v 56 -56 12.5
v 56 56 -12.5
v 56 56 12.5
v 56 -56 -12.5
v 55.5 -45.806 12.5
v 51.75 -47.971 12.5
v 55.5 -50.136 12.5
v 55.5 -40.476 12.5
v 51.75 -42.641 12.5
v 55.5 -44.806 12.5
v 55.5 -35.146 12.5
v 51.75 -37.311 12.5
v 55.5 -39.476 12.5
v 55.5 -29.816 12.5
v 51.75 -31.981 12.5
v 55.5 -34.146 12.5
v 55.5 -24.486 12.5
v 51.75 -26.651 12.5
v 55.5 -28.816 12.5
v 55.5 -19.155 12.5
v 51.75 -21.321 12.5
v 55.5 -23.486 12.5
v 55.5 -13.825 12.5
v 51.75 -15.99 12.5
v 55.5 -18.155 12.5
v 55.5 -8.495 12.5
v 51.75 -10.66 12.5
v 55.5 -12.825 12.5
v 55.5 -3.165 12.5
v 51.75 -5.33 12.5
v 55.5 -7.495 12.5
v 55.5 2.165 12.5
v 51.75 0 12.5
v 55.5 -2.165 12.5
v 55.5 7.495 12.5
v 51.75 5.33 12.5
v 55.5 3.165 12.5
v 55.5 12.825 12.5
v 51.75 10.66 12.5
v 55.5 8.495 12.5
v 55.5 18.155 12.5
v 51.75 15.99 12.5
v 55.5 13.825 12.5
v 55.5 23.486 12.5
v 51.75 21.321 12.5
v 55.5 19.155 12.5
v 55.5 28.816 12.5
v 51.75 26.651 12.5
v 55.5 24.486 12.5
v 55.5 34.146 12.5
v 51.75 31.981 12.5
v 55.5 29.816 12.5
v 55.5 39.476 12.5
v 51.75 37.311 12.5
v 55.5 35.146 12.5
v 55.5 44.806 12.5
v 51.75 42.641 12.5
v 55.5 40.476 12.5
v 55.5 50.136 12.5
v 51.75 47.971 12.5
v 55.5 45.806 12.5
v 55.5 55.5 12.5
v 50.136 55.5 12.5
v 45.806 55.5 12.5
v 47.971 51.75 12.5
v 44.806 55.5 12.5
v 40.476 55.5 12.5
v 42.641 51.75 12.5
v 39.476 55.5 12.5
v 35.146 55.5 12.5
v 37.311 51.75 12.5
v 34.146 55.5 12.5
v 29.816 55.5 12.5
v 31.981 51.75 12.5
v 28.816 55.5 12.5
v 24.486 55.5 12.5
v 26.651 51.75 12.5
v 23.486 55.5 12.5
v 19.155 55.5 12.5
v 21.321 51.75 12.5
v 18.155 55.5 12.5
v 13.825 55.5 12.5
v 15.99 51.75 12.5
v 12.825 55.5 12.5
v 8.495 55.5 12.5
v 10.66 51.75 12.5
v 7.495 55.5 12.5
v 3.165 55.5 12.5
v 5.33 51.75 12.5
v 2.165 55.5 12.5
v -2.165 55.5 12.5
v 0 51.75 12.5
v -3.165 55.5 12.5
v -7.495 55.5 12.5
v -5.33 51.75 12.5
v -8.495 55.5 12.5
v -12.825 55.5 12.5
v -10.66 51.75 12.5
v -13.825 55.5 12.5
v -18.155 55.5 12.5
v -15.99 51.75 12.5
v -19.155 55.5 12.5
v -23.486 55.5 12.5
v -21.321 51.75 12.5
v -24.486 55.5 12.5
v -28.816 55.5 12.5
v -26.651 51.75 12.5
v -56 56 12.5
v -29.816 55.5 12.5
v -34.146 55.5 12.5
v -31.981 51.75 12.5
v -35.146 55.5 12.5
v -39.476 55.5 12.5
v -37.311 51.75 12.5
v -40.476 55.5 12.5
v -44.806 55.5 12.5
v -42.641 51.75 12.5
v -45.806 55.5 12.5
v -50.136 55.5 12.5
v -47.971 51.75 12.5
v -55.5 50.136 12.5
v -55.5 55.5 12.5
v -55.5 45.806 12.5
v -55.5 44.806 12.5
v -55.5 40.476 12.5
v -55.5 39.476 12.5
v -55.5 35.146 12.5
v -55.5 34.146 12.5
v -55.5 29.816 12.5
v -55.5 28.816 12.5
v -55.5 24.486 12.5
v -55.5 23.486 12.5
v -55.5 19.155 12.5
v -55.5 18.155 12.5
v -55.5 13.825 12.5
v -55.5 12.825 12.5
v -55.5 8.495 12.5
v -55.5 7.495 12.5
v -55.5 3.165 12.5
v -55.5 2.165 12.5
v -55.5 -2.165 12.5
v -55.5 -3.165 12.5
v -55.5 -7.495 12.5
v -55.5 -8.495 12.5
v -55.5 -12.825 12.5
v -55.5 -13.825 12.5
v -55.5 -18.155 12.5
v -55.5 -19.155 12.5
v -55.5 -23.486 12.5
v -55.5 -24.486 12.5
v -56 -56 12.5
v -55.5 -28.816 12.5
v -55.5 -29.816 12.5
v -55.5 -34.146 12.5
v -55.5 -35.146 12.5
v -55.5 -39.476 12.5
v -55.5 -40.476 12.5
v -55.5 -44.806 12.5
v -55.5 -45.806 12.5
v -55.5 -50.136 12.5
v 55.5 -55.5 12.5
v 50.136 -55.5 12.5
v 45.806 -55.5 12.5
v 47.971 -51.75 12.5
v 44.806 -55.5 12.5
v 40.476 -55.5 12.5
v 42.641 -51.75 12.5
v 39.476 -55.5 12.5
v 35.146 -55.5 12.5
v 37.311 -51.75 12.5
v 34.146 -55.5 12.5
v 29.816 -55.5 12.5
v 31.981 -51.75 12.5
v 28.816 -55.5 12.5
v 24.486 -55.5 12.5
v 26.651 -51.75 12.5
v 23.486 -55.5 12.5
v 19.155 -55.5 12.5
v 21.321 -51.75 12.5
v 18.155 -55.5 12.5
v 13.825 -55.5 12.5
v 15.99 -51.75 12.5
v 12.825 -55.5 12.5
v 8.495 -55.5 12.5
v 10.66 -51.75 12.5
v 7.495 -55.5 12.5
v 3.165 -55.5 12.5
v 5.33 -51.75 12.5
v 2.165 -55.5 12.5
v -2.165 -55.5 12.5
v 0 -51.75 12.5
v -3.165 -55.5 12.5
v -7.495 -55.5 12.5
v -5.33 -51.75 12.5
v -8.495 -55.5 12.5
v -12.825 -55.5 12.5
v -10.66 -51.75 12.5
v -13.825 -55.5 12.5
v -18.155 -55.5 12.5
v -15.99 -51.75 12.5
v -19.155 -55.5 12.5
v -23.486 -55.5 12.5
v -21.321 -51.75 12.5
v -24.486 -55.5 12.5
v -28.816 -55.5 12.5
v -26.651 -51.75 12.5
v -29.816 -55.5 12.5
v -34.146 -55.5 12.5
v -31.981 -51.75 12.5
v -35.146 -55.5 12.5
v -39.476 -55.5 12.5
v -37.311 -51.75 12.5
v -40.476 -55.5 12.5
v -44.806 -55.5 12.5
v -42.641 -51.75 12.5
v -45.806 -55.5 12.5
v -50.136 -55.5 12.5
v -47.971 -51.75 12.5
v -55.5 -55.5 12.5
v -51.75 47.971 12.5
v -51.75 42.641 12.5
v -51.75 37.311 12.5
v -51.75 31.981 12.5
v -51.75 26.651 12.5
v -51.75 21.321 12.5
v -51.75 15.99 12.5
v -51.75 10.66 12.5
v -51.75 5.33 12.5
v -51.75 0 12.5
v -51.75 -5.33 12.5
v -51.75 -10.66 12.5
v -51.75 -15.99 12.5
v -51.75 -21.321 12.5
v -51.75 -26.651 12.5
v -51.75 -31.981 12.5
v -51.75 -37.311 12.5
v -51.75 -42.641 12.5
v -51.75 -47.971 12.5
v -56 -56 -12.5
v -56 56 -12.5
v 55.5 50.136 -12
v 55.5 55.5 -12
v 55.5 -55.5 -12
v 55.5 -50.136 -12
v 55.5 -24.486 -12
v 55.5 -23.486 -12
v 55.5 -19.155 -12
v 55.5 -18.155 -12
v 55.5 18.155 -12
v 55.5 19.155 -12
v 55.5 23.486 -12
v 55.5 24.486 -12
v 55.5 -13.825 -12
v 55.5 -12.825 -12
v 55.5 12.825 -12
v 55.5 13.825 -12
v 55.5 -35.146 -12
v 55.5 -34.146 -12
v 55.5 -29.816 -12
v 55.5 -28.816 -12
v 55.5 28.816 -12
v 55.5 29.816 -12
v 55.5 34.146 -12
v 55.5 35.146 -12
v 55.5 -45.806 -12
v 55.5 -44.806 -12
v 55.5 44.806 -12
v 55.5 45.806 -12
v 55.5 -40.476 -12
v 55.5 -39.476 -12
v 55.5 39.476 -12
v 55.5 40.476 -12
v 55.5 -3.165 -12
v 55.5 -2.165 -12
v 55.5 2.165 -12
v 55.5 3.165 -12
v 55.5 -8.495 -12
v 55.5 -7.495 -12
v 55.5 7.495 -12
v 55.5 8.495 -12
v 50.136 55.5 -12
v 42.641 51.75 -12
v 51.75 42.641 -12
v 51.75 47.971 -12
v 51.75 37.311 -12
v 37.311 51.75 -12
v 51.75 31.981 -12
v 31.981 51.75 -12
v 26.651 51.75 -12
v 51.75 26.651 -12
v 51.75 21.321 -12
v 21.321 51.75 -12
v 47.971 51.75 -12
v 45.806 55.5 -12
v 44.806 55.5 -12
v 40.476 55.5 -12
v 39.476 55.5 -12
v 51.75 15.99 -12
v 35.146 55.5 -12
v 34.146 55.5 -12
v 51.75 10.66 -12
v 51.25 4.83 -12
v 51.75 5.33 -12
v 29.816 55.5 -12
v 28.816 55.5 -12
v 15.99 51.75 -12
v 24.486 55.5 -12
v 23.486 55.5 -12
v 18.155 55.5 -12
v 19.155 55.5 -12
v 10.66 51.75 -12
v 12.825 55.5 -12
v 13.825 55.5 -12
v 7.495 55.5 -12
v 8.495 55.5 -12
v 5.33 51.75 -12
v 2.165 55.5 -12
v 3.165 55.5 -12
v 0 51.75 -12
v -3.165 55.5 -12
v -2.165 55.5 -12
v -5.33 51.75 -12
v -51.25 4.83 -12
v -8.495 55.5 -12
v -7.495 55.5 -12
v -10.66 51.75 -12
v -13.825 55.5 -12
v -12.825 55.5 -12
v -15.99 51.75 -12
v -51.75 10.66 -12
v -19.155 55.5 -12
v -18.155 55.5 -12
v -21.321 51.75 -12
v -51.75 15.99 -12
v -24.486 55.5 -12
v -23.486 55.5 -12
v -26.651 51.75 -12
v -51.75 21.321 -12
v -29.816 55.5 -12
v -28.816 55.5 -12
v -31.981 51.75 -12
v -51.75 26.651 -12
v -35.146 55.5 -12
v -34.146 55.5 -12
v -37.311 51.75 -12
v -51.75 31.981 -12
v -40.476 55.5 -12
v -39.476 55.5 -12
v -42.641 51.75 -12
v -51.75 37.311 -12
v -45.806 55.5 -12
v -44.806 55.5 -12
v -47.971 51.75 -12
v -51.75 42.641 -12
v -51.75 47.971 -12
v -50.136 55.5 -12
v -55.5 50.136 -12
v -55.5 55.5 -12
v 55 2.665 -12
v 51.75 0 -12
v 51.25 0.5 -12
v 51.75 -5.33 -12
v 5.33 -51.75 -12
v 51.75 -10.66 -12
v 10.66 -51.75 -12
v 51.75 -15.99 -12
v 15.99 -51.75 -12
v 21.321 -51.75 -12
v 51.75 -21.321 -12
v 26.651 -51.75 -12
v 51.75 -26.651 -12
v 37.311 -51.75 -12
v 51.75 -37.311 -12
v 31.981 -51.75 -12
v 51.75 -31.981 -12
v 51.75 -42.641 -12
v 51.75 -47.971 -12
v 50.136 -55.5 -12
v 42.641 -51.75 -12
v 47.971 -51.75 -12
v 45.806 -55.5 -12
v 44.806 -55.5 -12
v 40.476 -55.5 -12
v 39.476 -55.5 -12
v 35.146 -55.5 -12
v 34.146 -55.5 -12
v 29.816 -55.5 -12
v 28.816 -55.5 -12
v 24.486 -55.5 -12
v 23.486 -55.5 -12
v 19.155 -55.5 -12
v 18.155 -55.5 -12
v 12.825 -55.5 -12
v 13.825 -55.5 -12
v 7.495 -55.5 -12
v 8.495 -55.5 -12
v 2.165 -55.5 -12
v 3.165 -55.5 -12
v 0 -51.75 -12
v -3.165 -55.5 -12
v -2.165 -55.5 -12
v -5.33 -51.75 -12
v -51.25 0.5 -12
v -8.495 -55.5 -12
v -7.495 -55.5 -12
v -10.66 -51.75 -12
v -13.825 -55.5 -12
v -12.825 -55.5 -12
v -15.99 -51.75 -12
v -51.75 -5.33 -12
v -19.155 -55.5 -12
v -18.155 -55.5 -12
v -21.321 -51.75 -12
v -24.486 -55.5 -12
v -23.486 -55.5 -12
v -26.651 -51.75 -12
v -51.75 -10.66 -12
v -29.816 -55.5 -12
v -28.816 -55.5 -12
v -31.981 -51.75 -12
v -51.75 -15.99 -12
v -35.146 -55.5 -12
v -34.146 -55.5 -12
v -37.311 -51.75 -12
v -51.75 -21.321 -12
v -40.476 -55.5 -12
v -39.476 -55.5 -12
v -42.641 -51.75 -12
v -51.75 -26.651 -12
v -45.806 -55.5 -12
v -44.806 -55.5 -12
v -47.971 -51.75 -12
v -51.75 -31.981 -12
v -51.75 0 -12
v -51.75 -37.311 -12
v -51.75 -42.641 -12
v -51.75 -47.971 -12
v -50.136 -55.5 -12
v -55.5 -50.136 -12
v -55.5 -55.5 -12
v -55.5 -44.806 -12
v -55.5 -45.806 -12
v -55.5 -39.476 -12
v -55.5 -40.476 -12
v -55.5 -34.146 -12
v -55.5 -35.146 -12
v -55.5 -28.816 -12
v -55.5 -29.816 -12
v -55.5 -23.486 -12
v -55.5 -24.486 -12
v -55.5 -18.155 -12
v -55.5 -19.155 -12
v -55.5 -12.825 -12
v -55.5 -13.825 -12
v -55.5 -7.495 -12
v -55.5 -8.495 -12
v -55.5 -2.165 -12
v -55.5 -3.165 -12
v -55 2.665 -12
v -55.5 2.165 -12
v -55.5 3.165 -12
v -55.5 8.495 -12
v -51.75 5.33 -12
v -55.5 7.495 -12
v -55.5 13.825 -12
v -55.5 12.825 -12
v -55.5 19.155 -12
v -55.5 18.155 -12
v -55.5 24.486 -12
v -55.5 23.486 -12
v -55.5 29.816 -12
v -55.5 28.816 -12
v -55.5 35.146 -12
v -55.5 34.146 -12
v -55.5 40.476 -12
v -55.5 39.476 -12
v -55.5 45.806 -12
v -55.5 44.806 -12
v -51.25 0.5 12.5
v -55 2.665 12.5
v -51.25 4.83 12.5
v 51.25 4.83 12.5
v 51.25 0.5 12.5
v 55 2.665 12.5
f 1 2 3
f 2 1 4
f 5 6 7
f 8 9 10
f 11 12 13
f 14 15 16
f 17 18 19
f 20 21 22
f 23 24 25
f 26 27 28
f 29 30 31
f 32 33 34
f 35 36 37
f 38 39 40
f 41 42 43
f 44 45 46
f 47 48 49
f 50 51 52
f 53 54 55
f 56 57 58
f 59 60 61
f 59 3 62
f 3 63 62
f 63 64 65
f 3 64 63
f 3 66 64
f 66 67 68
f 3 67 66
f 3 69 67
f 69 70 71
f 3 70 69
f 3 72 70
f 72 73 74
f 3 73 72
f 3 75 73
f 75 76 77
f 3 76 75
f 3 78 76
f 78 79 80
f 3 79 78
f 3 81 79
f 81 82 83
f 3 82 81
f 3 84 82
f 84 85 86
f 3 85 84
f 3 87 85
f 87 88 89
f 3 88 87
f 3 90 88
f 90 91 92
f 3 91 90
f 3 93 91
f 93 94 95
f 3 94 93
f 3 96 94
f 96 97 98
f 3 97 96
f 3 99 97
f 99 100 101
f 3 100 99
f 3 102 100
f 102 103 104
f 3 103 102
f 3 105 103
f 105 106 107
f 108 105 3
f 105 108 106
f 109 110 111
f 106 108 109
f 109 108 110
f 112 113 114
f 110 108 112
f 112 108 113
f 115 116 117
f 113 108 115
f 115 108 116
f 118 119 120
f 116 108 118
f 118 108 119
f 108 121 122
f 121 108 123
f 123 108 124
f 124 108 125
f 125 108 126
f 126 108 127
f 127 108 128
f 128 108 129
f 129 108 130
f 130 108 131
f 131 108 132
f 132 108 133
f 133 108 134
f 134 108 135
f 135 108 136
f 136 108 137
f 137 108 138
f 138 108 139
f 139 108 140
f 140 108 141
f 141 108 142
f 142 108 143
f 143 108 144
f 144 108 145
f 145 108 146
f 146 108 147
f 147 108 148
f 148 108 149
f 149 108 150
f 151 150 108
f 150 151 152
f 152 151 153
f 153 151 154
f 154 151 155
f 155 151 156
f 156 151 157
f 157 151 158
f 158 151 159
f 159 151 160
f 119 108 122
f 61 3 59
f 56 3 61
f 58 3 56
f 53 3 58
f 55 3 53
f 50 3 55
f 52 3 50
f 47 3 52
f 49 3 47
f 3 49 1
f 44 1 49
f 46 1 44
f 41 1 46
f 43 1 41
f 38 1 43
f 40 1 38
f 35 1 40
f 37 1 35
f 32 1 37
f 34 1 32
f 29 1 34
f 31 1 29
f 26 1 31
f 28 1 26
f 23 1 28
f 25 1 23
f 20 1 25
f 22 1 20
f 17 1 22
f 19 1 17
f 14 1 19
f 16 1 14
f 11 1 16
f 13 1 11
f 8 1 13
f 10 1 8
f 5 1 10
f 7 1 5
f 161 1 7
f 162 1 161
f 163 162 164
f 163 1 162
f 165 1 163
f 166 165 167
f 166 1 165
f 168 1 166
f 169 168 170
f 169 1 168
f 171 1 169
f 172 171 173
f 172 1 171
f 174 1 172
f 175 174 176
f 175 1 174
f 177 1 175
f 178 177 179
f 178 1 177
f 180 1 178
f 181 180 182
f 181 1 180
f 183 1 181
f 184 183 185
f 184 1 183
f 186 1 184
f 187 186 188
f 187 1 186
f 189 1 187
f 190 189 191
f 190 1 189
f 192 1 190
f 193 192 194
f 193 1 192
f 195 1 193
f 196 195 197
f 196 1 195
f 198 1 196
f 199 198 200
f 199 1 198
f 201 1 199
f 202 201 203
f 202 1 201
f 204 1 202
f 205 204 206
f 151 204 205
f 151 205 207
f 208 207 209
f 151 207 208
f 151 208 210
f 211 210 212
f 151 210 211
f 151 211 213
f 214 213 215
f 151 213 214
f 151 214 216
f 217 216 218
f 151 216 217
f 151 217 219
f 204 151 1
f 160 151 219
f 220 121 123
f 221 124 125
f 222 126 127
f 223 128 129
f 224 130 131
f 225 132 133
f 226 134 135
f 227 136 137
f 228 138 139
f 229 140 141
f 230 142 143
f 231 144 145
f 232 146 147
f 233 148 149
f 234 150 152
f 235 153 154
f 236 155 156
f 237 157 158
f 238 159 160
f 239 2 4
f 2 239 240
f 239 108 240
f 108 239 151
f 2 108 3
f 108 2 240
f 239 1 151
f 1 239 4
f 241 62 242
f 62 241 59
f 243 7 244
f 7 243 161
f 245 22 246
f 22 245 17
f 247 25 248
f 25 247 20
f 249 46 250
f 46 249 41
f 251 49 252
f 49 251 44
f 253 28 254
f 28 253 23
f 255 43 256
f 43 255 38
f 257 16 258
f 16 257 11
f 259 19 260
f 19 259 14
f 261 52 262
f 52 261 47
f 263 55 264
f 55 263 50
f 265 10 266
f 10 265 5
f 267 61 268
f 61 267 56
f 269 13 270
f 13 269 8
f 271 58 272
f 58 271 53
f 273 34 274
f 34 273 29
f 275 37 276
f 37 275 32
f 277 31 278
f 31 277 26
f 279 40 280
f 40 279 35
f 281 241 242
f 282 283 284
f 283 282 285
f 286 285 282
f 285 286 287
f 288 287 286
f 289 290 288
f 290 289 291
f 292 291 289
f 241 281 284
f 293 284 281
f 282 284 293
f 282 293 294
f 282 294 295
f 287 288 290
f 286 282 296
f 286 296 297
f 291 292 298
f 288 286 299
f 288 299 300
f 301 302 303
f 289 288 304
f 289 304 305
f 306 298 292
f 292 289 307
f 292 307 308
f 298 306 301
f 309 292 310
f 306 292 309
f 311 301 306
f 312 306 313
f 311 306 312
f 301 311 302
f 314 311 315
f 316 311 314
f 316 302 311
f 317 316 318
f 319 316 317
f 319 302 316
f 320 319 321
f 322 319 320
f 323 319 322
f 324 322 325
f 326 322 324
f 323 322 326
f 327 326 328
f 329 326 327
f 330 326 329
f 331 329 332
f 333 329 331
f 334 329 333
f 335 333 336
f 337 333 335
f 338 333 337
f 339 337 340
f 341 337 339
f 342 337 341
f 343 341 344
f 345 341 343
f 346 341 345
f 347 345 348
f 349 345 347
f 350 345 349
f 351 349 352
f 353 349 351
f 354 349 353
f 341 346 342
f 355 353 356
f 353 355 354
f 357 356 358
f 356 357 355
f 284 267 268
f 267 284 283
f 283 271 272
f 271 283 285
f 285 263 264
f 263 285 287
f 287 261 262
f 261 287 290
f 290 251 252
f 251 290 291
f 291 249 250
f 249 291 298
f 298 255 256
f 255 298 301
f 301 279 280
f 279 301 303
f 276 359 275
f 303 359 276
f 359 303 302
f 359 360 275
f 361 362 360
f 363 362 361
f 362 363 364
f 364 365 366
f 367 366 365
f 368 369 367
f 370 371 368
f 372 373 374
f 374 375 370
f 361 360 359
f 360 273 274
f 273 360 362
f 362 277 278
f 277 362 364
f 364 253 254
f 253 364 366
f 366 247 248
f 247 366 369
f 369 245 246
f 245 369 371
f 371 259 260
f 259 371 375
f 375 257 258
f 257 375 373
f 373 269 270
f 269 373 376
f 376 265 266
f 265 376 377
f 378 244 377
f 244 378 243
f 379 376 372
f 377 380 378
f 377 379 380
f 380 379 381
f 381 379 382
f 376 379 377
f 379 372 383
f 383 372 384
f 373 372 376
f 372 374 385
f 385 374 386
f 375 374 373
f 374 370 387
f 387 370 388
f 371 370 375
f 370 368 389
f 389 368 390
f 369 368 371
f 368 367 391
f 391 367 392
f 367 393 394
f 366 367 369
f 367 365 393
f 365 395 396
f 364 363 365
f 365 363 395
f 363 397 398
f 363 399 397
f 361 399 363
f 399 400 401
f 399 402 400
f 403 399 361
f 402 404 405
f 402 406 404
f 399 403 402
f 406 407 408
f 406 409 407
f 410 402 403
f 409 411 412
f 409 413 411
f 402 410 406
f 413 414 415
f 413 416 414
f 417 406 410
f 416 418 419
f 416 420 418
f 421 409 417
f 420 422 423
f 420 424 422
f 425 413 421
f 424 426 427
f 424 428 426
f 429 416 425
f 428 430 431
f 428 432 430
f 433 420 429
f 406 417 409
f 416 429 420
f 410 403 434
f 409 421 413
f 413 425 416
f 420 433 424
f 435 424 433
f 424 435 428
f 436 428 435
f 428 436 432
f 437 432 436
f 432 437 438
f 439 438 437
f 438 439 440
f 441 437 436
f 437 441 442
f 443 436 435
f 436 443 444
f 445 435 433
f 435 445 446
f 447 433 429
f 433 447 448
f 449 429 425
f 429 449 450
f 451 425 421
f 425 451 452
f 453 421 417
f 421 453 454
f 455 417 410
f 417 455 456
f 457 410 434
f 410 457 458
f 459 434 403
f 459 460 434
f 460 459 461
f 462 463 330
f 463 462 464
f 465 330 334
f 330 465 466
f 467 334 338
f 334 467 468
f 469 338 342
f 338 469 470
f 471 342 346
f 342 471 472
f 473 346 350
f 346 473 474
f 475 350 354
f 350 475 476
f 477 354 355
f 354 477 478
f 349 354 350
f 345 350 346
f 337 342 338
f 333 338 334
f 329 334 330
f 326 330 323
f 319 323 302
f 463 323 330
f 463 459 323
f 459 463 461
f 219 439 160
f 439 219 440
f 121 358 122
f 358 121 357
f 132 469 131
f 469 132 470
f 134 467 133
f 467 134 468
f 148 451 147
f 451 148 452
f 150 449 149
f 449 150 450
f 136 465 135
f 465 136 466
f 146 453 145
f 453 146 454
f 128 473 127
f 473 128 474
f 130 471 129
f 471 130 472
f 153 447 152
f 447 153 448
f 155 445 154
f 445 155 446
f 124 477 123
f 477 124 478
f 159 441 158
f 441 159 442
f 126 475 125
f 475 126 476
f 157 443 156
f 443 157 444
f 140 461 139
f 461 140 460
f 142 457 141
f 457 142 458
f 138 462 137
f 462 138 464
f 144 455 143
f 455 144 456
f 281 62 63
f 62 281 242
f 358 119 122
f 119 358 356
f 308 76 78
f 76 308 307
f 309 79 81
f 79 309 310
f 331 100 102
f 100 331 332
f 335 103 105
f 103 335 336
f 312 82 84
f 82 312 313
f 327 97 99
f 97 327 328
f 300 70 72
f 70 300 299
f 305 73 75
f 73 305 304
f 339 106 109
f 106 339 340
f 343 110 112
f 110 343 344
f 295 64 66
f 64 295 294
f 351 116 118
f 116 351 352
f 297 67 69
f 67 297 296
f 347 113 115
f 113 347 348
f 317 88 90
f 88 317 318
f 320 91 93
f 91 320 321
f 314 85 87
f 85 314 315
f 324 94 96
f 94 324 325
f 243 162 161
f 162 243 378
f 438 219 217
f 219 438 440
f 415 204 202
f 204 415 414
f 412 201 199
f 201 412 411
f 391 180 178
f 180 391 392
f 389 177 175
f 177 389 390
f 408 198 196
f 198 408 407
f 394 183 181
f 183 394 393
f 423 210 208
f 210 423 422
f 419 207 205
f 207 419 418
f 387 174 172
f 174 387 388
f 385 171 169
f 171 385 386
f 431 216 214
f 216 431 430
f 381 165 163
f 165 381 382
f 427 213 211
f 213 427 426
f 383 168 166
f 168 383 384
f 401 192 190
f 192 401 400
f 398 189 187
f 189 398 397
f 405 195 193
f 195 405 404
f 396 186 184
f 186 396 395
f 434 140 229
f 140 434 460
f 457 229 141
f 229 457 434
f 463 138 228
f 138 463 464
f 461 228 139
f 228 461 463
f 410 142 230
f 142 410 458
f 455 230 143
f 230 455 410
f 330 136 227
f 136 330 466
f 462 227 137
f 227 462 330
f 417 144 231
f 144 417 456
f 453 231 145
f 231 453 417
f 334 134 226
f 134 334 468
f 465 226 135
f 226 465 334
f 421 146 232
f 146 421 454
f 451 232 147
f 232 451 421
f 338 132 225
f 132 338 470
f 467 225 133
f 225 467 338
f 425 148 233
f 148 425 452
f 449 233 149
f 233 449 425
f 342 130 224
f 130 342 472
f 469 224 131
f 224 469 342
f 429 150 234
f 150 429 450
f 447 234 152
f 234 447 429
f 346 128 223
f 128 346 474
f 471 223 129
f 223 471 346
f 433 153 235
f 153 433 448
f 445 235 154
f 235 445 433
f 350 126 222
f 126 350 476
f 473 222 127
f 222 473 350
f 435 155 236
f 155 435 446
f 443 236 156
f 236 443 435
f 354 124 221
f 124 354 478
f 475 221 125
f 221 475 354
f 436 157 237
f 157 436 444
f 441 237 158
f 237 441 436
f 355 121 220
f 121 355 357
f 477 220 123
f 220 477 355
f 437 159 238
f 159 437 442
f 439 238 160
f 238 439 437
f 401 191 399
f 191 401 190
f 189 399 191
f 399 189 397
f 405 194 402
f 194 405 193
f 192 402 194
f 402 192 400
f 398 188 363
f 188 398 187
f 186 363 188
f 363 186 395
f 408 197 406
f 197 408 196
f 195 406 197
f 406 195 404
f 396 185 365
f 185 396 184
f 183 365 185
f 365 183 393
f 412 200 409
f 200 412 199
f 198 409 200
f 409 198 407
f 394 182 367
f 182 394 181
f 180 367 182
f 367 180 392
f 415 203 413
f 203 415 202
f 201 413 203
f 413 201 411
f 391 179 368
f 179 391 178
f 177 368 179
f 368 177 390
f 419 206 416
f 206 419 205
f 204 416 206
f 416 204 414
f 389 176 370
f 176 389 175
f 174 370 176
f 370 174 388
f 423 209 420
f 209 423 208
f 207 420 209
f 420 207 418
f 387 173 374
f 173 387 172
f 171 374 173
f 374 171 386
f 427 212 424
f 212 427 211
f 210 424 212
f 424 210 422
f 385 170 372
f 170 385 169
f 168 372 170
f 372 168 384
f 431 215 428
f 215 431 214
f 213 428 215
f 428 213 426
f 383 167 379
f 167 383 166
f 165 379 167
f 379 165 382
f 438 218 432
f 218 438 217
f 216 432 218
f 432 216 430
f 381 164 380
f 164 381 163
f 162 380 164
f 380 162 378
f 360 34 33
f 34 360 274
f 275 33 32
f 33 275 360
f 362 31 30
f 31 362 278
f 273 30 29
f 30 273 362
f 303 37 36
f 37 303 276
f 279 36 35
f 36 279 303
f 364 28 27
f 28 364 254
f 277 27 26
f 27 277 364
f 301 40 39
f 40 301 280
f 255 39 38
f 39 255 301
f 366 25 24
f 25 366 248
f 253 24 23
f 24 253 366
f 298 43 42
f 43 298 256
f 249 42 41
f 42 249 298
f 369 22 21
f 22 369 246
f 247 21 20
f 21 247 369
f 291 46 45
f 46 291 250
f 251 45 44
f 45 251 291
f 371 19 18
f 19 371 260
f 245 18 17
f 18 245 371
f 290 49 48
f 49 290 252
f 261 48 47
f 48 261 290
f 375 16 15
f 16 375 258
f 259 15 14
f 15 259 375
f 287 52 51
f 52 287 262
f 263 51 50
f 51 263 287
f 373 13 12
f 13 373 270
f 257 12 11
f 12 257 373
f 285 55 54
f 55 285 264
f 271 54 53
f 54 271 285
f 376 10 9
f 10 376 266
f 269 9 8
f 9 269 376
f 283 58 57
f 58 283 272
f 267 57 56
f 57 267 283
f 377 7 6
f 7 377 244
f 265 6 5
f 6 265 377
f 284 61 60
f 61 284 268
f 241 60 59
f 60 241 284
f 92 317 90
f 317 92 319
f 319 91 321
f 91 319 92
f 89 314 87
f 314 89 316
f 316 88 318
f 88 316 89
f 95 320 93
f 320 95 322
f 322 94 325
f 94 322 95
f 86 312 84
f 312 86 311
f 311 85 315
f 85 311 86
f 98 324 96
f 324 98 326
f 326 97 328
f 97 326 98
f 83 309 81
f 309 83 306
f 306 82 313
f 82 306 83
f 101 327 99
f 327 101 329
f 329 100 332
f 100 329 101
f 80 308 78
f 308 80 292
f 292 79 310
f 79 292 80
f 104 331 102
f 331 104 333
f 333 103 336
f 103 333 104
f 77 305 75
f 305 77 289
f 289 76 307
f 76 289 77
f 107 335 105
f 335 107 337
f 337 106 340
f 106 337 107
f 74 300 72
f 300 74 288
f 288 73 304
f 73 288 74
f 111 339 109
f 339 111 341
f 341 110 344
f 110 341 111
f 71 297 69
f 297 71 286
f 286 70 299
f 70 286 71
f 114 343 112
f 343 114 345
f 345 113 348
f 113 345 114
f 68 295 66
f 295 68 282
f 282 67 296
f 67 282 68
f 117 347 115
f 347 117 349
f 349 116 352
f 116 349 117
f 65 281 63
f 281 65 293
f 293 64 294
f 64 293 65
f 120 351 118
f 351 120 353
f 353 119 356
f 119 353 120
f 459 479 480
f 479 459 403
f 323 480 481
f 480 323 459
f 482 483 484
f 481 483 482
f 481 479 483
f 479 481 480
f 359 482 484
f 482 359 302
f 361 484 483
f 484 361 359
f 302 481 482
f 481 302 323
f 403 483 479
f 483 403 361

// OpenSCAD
x = 112;
y = 112;
z = 25;
t = 1;
d = 5;
e = d*sqrt(3)/2;

box();
triangleWallSquare();
translate([0,(e+t)/2,0])
gap();

module box() {
    difference(){
        cube([x,y,z], true);
        translate([0,0,t/2])
        cube([x-t,y-t,z], true);
    }
}

module gap(){
    translate([0,0,t/4])
    cube([x-t*2-(d/2+d/4)*2,e,z-t/2],true); 
    for (i = [1,-1]) {
        translate([((x-d)/2-t)*-i,0,0])
        rotate(90+90*i)
        triangle();
    }   
}

module triangle() {
    translate([0,0,t/4])
    cylinder(d=d,h=z-t/2,$fn=3,center=true);
}

module triangleWall(){    
    for (i = [0:y/2/(e+t)-1]) {
        for (j = [1,-1]) {
            translate([x/-2+t/2+d/4,(e+t)*i*j,0])
            triangle();
        }
    }
}

module triangleWallSquare(){
    for (i = [0:4]) {
        rotate(90*i)
        triangleWall();
    }
}
